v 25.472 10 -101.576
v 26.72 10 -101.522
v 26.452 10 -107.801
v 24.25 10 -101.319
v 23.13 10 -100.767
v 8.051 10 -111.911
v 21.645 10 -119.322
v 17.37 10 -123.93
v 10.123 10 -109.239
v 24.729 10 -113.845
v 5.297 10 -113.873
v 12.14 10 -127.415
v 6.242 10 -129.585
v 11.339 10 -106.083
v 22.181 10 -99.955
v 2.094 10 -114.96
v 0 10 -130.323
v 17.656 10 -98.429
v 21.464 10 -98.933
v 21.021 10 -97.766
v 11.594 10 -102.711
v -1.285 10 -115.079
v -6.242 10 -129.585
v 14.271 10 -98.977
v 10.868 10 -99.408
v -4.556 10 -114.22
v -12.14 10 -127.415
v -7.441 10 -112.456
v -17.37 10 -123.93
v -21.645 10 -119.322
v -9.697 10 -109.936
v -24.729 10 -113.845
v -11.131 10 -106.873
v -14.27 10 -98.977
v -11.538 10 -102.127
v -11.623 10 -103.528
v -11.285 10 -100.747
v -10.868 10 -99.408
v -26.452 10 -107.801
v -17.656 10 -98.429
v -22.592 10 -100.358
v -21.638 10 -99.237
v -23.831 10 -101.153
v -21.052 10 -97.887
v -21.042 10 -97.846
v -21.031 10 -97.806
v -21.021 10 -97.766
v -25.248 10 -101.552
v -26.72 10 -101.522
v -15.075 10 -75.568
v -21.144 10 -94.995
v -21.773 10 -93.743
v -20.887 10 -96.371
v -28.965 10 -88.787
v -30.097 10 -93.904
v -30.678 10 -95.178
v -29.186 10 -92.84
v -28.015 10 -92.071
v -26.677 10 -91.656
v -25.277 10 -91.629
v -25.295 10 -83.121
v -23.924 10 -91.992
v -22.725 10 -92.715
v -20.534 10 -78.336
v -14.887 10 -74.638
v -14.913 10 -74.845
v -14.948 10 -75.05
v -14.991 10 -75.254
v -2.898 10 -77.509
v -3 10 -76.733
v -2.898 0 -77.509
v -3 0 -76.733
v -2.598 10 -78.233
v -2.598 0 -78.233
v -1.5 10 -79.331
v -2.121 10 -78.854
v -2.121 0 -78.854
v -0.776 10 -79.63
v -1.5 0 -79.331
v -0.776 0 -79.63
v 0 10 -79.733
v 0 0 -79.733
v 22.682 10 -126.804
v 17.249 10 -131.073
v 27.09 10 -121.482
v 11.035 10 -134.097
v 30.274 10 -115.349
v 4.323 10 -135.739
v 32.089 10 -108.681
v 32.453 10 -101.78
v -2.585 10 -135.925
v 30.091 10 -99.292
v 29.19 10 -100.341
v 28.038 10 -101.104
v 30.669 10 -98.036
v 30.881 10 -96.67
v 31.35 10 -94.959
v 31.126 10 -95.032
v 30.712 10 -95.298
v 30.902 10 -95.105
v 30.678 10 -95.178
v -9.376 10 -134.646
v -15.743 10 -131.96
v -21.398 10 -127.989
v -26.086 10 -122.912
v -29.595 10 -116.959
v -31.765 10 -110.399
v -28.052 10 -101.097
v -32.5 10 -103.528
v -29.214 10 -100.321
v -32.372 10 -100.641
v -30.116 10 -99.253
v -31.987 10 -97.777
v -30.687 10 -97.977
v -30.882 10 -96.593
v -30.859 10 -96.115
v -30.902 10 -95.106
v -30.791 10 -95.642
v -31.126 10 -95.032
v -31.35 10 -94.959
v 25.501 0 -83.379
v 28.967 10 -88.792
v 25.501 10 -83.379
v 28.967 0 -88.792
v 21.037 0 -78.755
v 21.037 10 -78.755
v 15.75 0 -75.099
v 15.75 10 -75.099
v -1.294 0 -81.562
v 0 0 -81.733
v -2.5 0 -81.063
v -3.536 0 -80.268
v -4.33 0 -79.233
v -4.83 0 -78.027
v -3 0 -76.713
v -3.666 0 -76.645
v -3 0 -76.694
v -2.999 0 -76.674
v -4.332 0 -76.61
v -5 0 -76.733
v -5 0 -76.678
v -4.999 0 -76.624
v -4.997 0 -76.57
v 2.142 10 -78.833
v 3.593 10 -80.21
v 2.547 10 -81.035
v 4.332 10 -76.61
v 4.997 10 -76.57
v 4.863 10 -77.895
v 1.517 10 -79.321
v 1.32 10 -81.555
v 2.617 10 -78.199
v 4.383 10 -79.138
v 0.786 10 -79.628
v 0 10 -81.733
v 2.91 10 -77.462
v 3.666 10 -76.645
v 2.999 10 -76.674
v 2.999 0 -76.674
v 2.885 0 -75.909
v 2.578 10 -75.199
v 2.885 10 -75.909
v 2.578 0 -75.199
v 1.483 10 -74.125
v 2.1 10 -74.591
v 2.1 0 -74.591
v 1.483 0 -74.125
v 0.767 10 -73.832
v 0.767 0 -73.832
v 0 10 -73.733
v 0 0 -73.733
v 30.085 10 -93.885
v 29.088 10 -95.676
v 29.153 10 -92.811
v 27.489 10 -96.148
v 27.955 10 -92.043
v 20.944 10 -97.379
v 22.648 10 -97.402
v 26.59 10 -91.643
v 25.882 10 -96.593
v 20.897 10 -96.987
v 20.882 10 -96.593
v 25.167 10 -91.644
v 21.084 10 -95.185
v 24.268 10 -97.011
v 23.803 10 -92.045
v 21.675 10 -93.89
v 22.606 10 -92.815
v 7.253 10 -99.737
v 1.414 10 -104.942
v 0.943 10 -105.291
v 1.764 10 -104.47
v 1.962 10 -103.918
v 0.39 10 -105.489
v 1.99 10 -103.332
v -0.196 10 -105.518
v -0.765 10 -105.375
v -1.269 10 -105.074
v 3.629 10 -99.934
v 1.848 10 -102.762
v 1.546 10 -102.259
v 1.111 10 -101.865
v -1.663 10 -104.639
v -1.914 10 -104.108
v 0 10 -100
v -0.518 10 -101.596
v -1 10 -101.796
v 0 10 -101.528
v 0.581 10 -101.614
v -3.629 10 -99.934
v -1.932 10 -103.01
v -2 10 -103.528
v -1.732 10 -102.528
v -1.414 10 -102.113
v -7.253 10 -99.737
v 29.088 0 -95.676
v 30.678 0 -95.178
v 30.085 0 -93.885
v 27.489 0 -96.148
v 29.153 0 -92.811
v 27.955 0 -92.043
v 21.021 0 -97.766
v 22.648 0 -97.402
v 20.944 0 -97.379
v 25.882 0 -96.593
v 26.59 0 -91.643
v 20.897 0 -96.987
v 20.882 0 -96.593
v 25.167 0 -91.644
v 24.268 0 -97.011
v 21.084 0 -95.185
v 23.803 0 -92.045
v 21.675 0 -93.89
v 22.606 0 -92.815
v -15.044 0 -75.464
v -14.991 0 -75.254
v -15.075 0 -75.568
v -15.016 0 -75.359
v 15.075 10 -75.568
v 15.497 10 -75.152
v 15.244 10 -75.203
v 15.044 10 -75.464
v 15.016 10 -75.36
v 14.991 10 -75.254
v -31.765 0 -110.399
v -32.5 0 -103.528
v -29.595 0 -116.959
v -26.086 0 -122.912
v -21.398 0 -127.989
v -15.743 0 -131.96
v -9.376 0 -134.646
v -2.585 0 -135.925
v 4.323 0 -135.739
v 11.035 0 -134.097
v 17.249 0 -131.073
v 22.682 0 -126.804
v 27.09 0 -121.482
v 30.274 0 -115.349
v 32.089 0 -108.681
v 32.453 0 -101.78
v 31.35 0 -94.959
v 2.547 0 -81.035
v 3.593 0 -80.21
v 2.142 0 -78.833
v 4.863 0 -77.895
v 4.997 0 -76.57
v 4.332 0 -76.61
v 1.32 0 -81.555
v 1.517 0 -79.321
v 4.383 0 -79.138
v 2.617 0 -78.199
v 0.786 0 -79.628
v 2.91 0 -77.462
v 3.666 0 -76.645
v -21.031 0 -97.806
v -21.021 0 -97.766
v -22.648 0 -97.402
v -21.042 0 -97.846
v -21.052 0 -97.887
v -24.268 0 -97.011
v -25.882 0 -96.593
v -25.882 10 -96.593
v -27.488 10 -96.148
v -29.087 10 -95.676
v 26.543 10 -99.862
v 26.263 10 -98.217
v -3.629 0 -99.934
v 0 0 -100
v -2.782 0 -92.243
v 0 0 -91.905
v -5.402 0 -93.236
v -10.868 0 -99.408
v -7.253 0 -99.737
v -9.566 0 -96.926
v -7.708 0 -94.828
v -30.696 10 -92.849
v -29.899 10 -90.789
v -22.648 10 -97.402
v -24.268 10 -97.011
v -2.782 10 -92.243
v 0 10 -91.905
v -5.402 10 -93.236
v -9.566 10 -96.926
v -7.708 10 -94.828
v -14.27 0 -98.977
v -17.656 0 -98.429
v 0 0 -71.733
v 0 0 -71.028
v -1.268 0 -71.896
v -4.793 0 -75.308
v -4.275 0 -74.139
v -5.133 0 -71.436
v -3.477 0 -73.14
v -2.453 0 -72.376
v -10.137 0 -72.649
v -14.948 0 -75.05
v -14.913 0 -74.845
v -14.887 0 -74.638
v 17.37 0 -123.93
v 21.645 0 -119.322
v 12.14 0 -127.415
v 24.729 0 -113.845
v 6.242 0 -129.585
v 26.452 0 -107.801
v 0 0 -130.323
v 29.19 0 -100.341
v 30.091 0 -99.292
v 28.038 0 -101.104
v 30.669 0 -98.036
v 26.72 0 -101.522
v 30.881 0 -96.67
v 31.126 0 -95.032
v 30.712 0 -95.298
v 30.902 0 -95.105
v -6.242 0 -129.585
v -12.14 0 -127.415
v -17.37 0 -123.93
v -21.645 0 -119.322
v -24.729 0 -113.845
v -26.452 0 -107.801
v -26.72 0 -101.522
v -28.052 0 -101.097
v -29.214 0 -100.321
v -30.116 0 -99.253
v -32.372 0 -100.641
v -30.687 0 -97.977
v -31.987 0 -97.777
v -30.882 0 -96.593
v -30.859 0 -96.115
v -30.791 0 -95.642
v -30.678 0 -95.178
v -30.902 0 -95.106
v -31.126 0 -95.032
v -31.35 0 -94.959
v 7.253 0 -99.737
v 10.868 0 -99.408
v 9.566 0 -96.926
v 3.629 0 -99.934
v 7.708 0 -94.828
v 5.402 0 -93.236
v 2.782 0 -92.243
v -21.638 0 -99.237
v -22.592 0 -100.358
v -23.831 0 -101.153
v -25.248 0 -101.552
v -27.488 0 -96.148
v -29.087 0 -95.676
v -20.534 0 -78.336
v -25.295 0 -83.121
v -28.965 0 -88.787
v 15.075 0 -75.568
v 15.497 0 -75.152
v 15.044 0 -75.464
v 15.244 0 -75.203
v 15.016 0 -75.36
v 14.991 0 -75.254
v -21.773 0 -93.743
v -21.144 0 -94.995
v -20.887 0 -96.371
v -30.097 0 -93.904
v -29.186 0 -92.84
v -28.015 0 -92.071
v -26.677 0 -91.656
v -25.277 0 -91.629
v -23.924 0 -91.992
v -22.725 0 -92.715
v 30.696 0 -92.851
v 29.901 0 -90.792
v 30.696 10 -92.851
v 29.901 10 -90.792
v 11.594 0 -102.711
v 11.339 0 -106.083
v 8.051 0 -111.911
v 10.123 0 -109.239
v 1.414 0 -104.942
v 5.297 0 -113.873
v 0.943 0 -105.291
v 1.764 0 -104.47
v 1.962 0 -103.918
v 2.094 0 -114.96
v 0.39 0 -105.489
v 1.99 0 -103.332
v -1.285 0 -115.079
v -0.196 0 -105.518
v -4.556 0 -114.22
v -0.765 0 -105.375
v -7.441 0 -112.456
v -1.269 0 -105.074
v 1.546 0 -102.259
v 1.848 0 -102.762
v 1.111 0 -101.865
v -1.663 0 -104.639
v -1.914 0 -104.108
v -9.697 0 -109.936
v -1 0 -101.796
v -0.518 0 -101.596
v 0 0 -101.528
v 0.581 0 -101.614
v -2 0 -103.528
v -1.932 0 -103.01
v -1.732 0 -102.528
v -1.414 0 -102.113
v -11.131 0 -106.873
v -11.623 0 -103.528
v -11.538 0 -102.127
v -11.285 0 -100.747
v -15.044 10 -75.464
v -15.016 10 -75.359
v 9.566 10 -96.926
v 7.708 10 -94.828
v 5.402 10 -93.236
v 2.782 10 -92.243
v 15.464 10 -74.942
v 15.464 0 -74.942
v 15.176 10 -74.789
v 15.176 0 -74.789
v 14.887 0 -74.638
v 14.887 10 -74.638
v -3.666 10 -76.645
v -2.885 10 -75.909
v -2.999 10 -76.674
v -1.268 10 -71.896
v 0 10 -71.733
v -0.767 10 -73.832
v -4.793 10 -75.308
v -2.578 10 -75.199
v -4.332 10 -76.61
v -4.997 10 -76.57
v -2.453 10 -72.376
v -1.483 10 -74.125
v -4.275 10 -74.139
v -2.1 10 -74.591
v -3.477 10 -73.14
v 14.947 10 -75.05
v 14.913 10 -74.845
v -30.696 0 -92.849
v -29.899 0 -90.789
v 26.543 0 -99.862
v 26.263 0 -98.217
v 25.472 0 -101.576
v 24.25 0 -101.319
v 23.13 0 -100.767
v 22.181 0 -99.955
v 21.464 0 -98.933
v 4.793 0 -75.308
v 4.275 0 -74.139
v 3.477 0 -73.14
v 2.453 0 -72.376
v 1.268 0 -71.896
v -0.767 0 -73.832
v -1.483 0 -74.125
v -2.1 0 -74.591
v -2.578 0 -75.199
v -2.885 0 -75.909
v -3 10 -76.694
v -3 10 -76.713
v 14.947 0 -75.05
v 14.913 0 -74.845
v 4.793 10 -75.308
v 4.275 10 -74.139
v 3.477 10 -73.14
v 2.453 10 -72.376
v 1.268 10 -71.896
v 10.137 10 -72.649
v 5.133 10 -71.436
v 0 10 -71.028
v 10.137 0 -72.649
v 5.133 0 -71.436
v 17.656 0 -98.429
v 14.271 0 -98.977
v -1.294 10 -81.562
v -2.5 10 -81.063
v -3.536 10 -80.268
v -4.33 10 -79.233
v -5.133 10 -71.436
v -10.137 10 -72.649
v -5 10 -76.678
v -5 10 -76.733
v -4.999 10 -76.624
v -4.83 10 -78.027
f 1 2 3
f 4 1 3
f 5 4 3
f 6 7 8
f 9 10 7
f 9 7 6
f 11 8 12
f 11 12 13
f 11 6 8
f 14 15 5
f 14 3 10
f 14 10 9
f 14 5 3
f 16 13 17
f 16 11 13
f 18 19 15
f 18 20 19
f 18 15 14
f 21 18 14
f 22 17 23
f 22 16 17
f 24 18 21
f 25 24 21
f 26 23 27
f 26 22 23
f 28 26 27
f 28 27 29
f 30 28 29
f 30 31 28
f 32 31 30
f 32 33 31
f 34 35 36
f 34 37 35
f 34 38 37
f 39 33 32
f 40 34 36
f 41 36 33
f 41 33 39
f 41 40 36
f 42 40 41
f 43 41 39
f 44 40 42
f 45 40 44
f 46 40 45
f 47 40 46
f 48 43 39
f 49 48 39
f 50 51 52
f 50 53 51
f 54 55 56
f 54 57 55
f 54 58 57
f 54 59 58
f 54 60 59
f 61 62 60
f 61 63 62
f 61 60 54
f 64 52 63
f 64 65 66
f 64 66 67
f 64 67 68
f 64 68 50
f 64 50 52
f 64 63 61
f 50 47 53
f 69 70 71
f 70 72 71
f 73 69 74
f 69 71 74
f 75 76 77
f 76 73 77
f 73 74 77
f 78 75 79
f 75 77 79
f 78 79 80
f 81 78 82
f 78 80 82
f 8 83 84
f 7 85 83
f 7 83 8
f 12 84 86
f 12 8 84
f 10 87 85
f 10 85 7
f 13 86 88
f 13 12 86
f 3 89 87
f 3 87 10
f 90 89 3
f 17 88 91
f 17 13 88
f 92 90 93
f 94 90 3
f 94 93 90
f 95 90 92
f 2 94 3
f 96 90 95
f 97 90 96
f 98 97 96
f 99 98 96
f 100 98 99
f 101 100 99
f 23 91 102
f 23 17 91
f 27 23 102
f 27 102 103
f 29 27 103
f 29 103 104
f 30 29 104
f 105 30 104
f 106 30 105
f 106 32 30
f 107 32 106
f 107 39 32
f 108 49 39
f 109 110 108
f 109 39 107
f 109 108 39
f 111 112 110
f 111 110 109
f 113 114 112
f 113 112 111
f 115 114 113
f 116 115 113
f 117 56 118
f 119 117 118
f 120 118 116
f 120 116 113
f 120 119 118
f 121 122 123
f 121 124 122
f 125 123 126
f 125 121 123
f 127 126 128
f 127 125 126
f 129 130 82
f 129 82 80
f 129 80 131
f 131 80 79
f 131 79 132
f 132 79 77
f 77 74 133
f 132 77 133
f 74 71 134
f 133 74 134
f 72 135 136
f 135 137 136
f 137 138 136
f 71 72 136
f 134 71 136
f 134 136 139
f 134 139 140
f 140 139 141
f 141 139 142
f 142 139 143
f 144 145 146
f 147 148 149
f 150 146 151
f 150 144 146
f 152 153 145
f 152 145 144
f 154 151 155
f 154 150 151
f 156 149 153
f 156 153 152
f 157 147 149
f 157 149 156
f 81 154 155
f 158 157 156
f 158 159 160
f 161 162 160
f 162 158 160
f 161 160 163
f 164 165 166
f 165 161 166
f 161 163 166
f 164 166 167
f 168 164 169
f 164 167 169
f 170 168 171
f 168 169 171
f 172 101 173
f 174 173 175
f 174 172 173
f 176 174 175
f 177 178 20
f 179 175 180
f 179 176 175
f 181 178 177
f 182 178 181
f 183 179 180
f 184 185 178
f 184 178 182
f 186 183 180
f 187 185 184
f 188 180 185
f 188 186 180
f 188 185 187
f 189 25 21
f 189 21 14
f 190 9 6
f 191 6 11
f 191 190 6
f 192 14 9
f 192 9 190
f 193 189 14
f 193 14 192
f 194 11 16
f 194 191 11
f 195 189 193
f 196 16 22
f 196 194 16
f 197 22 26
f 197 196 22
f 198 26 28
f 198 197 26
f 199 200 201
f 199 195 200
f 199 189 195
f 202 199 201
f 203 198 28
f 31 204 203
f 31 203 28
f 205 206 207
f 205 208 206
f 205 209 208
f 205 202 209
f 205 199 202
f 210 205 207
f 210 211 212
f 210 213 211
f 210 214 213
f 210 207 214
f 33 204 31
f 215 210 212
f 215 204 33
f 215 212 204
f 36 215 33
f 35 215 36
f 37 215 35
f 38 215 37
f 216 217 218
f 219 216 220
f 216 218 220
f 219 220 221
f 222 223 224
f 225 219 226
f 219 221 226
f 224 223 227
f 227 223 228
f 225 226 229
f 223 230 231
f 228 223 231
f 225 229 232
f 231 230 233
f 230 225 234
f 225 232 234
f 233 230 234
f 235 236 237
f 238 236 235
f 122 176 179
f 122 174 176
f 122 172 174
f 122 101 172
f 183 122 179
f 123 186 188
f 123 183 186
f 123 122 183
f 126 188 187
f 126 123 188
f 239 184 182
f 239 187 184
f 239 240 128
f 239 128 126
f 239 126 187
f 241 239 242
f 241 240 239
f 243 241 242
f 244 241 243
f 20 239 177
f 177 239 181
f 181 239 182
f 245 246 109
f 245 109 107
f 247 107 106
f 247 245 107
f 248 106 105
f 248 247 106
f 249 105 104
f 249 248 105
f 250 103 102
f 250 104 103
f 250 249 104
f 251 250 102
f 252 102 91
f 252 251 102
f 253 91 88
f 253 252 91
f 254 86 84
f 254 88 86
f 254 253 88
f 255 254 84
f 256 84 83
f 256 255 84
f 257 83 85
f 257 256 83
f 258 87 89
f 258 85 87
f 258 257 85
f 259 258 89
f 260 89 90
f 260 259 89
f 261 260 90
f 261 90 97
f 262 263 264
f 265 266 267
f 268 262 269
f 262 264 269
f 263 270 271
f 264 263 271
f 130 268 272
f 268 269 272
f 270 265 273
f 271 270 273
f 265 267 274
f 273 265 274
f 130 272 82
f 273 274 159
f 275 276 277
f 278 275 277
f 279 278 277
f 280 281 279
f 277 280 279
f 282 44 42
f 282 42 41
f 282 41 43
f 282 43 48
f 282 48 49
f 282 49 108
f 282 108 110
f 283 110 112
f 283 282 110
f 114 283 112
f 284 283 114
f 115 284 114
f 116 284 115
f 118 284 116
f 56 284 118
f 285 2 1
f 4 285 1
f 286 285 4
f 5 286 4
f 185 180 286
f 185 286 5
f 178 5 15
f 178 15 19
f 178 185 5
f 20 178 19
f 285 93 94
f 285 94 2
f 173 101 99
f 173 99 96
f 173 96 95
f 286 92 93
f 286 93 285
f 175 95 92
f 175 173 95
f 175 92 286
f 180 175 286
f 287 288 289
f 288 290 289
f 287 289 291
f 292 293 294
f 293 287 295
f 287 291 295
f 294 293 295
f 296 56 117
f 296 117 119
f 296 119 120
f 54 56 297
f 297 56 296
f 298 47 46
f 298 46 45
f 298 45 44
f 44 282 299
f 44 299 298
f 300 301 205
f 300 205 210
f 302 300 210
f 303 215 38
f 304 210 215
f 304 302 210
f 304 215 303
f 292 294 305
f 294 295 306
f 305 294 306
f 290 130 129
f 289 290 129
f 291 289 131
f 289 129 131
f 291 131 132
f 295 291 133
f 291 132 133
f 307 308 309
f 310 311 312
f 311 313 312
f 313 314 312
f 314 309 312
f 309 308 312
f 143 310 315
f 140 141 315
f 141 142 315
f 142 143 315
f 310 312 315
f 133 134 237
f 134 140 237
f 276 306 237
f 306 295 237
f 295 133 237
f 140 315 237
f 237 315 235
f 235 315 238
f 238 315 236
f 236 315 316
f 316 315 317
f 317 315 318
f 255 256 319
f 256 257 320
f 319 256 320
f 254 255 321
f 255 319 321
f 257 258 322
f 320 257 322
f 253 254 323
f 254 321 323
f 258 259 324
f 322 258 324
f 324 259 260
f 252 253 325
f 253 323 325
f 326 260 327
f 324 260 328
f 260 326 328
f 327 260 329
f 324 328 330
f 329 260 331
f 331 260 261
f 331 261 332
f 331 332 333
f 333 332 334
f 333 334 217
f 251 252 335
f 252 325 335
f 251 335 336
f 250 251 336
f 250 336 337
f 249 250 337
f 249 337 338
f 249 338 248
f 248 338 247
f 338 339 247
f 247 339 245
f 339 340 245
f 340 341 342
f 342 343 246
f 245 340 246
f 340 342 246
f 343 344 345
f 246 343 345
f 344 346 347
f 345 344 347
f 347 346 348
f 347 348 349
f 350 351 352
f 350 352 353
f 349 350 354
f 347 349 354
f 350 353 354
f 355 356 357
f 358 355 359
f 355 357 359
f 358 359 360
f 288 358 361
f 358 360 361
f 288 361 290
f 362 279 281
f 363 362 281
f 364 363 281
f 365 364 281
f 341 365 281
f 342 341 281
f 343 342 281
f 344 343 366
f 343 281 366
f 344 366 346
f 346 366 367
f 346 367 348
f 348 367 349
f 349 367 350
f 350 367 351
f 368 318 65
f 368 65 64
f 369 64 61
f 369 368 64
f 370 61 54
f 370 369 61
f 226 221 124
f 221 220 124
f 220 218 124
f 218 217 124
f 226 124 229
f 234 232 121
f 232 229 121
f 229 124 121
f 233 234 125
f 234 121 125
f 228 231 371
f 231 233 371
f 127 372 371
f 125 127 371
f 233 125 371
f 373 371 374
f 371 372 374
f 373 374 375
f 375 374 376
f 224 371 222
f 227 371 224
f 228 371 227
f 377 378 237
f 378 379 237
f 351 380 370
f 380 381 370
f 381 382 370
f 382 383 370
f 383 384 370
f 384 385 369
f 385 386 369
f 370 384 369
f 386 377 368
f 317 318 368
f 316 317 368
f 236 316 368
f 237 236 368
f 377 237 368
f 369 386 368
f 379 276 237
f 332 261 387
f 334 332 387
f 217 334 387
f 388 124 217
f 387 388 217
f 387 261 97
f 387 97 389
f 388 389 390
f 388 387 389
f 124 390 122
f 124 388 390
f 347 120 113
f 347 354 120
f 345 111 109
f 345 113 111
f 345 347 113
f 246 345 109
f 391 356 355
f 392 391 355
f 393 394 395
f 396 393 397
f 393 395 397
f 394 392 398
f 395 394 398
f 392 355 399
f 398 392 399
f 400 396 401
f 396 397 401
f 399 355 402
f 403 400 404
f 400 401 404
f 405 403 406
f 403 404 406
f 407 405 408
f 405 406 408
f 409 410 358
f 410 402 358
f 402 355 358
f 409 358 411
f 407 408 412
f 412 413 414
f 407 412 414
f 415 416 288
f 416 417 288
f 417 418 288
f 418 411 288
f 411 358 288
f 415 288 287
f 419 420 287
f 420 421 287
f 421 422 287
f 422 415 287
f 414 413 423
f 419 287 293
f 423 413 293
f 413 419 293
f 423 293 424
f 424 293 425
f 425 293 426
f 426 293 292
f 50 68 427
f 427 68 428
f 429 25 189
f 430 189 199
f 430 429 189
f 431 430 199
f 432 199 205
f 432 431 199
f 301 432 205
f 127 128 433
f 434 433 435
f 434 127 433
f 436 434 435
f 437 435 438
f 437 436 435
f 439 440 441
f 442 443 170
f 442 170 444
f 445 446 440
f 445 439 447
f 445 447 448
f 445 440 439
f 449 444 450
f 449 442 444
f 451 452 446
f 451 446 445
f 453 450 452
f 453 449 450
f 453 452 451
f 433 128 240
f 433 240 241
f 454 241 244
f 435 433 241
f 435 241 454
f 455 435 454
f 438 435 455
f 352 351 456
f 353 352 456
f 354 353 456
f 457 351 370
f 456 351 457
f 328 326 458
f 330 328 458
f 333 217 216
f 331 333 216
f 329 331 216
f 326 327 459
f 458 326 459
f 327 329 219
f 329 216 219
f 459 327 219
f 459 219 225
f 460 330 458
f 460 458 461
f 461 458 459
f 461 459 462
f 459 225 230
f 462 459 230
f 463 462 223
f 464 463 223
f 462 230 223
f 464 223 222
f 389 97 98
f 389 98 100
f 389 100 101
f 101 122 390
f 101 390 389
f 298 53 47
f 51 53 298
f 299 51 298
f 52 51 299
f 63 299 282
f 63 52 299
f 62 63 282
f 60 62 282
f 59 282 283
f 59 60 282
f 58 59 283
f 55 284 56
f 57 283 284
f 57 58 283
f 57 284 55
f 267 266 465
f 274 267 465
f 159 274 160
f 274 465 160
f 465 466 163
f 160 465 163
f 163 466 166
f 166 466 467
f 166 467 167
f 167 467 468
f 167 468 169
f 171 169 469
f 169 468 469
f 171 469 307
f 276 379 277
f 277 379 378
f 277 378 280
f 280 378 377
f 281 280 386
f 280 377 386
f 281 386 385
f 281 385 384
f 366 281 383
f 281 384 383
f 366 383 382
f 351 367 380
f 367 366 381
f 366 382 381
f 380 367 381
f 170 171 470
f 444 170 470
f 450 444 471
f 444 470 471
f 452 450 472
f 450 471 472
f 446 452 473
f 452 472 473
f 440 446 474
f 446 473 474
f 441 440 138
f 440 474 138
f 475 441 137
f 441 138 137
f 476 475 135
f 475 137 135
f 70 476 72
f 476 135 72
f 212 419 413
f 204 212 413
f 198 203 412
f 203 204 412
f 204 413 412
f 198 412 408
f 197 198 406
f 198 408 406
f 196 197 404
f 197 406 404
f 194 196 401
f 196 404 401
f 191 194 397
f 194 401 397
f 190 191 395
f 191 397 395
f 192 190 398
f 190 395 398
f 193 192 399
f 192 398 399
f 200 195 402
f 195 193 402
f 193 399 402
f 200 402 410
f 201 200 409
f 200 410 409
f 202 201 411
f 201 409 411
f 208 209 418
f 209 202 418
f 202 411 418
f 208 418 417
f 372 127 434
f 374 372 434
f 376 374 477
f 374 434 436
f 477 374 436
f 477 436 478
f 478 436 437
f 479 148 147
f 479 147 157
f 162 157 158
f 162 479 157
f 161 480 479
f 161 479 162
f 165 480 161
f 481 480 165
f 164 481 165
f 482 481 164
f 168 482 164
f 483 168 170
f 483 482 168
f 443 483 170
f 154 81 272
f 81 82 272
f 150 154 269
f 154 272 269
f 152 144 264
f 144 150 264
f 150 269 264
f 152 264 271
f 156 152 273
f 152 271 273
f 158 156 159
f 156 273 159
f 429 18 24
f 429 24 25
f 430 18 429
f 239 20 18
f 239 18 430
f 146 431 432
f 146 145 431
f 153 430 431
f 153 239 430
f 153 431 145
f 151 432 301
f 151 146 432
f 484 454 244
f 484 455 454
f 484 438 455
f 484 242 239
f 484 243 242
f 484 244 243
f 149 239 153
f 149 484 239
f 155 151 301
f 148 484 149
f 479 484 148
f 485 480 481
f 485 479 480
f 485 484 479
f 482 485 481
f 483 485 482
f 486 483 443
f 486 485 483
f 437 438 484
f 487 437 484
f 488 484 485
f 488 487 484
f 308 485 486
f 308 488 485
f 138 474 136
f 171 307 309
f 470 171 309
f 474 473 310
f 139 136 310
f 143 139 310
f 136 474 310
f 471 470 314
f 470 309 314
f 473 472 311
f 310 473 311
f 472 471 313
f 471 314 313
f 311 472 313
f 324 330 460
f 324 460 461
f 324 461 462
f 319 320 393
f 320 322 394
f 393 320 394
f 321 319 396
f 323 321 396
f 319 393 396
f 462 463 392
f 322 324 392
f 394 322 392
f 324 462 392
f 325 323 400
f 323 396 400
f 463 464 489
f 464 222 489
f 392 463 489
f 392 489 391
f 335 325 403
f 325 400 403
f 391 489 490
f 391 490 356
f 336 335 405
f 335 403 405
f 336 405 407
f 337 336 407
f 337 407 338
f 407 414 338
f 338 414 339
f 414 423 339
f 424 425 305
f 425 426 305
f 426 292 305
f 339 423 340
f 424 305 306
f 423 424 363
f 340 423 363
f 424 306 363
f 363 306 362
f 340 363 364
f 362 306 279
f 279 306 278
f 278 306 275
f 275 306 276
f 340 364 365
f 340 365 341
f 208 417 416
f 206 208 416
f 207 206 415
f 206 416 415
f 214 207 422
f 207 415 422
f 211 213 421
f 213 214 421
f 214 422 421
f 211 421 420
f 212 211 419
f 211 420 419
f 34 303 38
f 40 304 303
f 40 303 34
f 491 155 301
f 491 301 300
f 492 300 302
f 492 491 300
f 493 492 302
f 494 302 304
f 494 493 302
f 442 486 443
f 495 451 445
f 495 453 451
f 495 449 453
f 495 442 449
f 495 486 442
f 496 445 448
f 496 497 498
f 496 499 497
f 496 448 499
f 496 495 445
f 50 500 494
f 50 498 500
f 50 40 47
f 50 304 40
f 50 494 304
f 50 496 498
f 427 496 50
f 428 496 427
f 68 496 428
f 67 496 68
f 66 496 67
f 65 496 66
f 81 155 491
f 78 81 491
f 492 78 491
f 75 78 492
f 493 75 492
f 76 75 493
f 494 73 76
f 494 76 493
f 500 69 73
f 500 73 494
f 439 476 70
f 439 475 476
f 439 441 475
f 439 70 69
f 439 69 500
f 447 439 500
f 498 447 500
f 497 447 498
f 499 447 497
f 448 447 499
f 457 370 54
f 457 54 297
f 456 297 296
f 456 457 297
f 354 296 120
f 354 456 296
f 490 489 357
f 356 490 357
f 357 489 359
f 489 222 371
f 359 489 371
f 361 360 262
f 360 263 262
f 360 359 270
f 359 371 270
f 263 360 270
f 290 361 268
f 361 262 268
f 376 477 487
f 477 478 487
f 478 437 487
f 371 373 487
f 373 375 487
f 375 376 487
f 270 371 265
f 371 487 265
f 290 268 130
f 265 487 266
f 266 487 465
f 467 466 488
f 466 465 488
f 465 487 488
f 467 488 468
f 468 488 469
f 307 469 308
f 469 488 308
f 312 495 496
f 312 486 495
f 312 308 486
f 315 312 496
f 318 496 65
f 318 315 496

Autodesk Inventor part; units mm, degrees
ref_plane "YZ Plane" through (0, 0, 0) normal (1, 0, 0) x (0, 1, 0)
ref_plane "XZ Plane" through (0, 0, 0) normal (0, 1, 0) x (-1, 0, 0)
ref_plane "XY Plane" through (0, 0, 0) normal (0, 0, 1) x (1, 0, 0)
sketch "Sketch1" plane through (0, 0, 0) normal (0, 1, 0) x (-1, 0, 0)
  line L0 (0, 0) -> (18.5658, -69.2885)
  circle A0 centre (25.8819, -96.5926) radius 5
  arc A1 (24.729, -72.9816) -> (15.0747, -75.5678) centre (19.8599, -74.1181) ccw
  line L1 (30.6777, -95.1782) -> (24.6448, -72.6673)
  line L2 (21.0523, -97.8867) -> (14.9907, -75.2542)
  circle A2 centre (0, -103.5276) radius 11.6229
  line L3 (21.0523, -97.8867) -> (25.8819, -96.5926)
  arc A3 (-25.8819, -96.5926) -> (26.7197, -101.5219) centre (0, -103.5276) ccw
  circle A4 centre (0, -103.5276) radius 39.9
  arc A5 (57.9067, -50.8394) -> (50.8389, -57.9063) centre (54.2582, -54.2582) ccw
  line L4 (67.1751, -74.2462) -> (50.6094, -57.6767)
  line L5 (74.1567, -67.0879) -> (57.6767, -50.6094)
  circle A6 centre (70.7107, -70.7107) radius 5
  circle A7 centre (51.7638, -89.6575) radius 11.6229
  arc A8 (75.5684, -15.0748) -> (72.9809, -24.7289) centre (74.1181, -19.8599) ccw
  line L6 (95.2985, -30.7115) -> (72.6673, -24.6448)
  line L7 (97.7655, -21.0214) -> (75.2542, -14.9907)
  circle A9 centre (96.5926, -25.8819) radius 5
  circle A10 centre (89.6575, -51.7638) radius 11.6229
  arc A11 (72.9816, 24.729) -> (75.5678, 15.0747) centre (74.1181, 19.8599) ccw
  line L8 (97.8867, 21.0523) -> (75.2542, 14.9907)
  line L9 (95.1782, 30.6777) -> (72.6673, 24.6448)
  circle A12 centre (96.5926, 25.8819) radius 5
  circle A13 centre (103.5276, 0) radius 11.6229
  arc A14 (50.8394, 57.9067) -> (57.9063, 50.8389) centre (54.2582, 54.2582) ccw
  line L10 (74.2462, 67.1751) -> (57.6767, 50.6094)
  line L11 (67.0879, 74.1567) -> (50.6094, 57.6767)
  circle A15 centre (70.7107, 70.7107) radius 5
  circle A16 centre (89.6575, 51.7638) radius 11.6229
  arc A17 (15.0748, 75.5684) -> (24.7289, 72.9809) centre (19.8599, 74.1181) ccw
  line L12 (30.7115, 95.2985) -> (24.6448, 72.6673)
  line L13 (21.0214, 97.7655) -> (14.9907, 75.2542)
  circle A18 centre (25.8819, 96.5926) radius 5
  circle A19 centre (51.7638, 89.6575) radius 11.6229
  arc A20 (-24.729, 72.9816) -> (-15.0747, 75.5678) centre (-19.8599, 74.1181) ccw
  line L14 (-21.0523, 97.8867) -> (-14.9907, 75.2542)
  line L15 (-30.6777, 95.1782) -> (-24.6448, 72.6673)
  circle A21 centre (-25.8819, 96.5926) radius 5
  circle A22 centre (0, 103.5276) radius 11.6229
  arc A23 (-57.9067, 50.8394) -> (-50.8389, 57.9063) centre (-54.2582, 54.2582) ccw
  line L16 (-67.1751, 74.2462) -> (-50.6094, 57.6767)
  line L17 (-74.1567, 67.0879) -> (-57.6767, 50.6094)
  circle A24 centre (-70.7107, 70.7107) radius 5
  circle A25 centre (-51.7638, 89.6575) radius 11.6229
  arc A26 (-75.5684, 15.0748) -> (-72.9809, 24.7289) centre (-74.1181, 19.8599) ccw
  line L18 (-95.2985, 30.7115) -> (-72.6673, 24.6448)
  line L19 (-97.7655, 21.0214) -> (-75.2542, 14.9907)
  circle A27 centre (-96.5926, 25.8819) radius 5
  circle A28 centre (-89.6575, 51.7638) radius 11.6229
  arc A29 (-72.9816, -24.729) -> (-75.5678, -15.0747) centre (-74.1181, -19.8599) ccw
  line L20 (-97.8867, -21.0523) -> (-75.2542, -14.9907)
  line L21 (-95.1782, -30.6777) -> (-72.6673, -24.6448)
  circle A30 centre (-96.5926, -25.8819) radius 5
  circle A31 centre (-103.5276, 0) radius 11.6229
  arc A32 (-50.8394, -57.9067) -> (-57.9063, -50.8389) centre (-54.2582, -54.2582) ccw
  line L22 (-74.2462, -67.1751) -> (-57.6767, -50.6094)
  line L23 (-67.0879, -74.1567) -> (-50.6094, -57.6767)
  circle A33 centre (-70.7107, -70.7107) radius 5
  circle A34 centre (-89.6575, -51.7638) radius 11.6229
  arc A35 (-15.0748, -75.5684) -> (-24.7289, -72.9809) centre (-19.8599, -74.1181) ccw
  line L24 (-30.7115, -95.2985) -> (-24.6448, -72.6673)
  line L25 (-21.0214, -97.7655) -> (-14.9907, -75.2542)
  circle A36 centre (-25.8819, -96.5926) radius 5
  circle A37 centre (-51.7638, -89.6575) radius 11.6229
  circle A38 centre (0, 0) radius 5
  circle A39 centre (0, -103.5276) radius 2
  circle A40 centre (0, -76.7327) radius 5
  circle A41 centre (0, -103.5276) radius 32.5
  circle A42 centre (0, -76.7327) radius 3
  circle A43 centre (0, -103.5276) radius 2
  arc A44 (24.6448, -72.6673) -> (-14.9907, -75.2542) centre (0, 0) ccw
  arc A45 (-4.9973, -76.5698) -> (4.9973, -76.5698) centre (0, 0) ccw
  line L26 (0, 0) -> (0, -63.6276)
  line L27 (0, -71.0276) -> (0, -103.5276)
  arc A46 (21.0199, -97.7659) -> (21.0214, -97.7655) centre (0, 0) ccw
  arc A47 (30.6777, -95.1782) -> (-21.0214, -97.7655) centre (0, 0) ccw
  point P0 (0, 0)
  point P1 (0, 0)
  point P2 (50.7227, -50.7227)
  point P3 (73.9009, -74.5607)
  point P4 (69.2885, -18.5658)
  point P5 (101.2804, -27.621)
  point P6 (69.2885, 18.5658)
  point P7 (101.5219, 26.7197)
  point P8 (50.7227, 50.7227)
  point P9 (74.5607, 73.9009)
  point P10 (18.5658, 69.2885)
  point P11 (27.621, 101.2804)
  point P12 (-18.5658, 69.2885)
  point P13 (-26.7197, 101.5219)
  point P14 (-50.7227, 50.7227)
  point P15 (-73.9009, 74.5607)
  point P16 (-69.2885, 18.5658)
  point P17 (-101.2804, 27.621)
  point P18 (-69.2885, -18.5658)
  point P19 (-101.5219, -26.7197)
  point P20 (-50.7227, -50.7227)
  point P21 (-74.5607, -73.9009)
  point P22 (-18.5658, -69.2885)
  point P23 (-27.621, -101.2804)
  point P24 (40.2917, -91.5236)
  point P25 (59.1159, -80.6555)
  point P26 (67.0867, -74.1578)
  point P27 (74.1567, -67.0879)
  point P28 (80.6555, -59.1159)
  point P29 (91.5236, -40.2917)
  point P30 (95.1777, -30.6791)
  point P31 (97.7655, -21.0214)
  point P32 (99.4077, -10.8682)
  point P33 (99.4077, 10.8682)
  point P34 (97.7659, 21.0199)
  point P35 (95.1782, 30.6777)
  point P36 (91.5236, 40.2917)
  point P37 (80.6555, 59.1159)
  point P38 (74.1578, 67.0867)
  point P39 (67.0879, 74.1567)
  point P40 (59.1159, 80.6555)
  point P41 (40.2917, 91.5236)
  point P42 (30.6791, 95.1777)
  point P43 (21.0214, 97.7655)
  point P44 (10.8682, 99.4077)
  point P45 (-10.8682, 99.4077)
  point P46 (-21.0199, 97.7659)
  point P47 (-30.6777, 95.1782)
  point P48 (-40.2917, 91.5236)
  point P49 (-59.1159, 80.6555)
  point P50 (-67.0867, 74.1578)
  point P51 (-74.1567, 67.0879)
  point P52 (-80.6555, 59.1159)
  point P53 (-91.5236, 40.2917)
  point P54 (-95.1777, 30.6791)
  point P55 (-97.7655, 21.0214)
  point P56 (-99.4077, 10.8682)
  point P57 (-99.4077, -10.8682)
  point P58 (-97.7659, -21.0199)
  point P59 (-95.1782, -30.6777)
  point P60 (-91.5236, -40.2917)
  point P61 (-80.6555, -59.1159)
  point P62 (-74.1578, -67.0867)
  point P63 (-67.0879, -74.1567)
  point P64 (-59.1159, -80.6555)
  point P65 (-40.2917, -91.5236)
  point P66 (-30.6791, -95.1777)
  point P67 (-21.0214, -97.7655)
  point P68 (-10.8682, -99.4077)
  point P69 (10.8682, -99.4077)
  point P70 (-10.8682, -99.4077)
  point P71 (10.8682, -99.4077)
  dimension "d6" = 79.8
  dimension "d11" = 65
  dimension "d4" = 10
  dimension "d5" = 10
  dimension "d7" = 360
  dimension "d8" = 10
  dimension "d9" = 4
  dimension "d10" = 10
  dimension "d12" = 6
extrude "Extrusion1" add sketch "Sketch1" along normal blind 10 contours A41 L1 A0 L2 A1 | A1 L2 A46 A2 L27 A40 A41 | A41 L27 A40 A2 A46 L25 A35 | A35 A44 A41 | L2 A1 | A41 A46 L1 | A35 L25 A36 L24 A41 A44 | A46 A41 L24 A36 A3 A0 | A46 A0 | A0 L3 A46 | L27 A42 A45 A40 | A40 A45 A42 L27 | L24 A46 A41 | A46 L3 A0 | A0 A3 A36 A46 A2 | A40 L27 A42 A45 | A45 A42 L27 A40 | A46 A36 | A36 A3 A46 | A46 A3 A36 L24 | A46 L27 A2 | A2 A46 | A2 L27 A46
properties part number "SC-1-02-Circle Arc Cover"
